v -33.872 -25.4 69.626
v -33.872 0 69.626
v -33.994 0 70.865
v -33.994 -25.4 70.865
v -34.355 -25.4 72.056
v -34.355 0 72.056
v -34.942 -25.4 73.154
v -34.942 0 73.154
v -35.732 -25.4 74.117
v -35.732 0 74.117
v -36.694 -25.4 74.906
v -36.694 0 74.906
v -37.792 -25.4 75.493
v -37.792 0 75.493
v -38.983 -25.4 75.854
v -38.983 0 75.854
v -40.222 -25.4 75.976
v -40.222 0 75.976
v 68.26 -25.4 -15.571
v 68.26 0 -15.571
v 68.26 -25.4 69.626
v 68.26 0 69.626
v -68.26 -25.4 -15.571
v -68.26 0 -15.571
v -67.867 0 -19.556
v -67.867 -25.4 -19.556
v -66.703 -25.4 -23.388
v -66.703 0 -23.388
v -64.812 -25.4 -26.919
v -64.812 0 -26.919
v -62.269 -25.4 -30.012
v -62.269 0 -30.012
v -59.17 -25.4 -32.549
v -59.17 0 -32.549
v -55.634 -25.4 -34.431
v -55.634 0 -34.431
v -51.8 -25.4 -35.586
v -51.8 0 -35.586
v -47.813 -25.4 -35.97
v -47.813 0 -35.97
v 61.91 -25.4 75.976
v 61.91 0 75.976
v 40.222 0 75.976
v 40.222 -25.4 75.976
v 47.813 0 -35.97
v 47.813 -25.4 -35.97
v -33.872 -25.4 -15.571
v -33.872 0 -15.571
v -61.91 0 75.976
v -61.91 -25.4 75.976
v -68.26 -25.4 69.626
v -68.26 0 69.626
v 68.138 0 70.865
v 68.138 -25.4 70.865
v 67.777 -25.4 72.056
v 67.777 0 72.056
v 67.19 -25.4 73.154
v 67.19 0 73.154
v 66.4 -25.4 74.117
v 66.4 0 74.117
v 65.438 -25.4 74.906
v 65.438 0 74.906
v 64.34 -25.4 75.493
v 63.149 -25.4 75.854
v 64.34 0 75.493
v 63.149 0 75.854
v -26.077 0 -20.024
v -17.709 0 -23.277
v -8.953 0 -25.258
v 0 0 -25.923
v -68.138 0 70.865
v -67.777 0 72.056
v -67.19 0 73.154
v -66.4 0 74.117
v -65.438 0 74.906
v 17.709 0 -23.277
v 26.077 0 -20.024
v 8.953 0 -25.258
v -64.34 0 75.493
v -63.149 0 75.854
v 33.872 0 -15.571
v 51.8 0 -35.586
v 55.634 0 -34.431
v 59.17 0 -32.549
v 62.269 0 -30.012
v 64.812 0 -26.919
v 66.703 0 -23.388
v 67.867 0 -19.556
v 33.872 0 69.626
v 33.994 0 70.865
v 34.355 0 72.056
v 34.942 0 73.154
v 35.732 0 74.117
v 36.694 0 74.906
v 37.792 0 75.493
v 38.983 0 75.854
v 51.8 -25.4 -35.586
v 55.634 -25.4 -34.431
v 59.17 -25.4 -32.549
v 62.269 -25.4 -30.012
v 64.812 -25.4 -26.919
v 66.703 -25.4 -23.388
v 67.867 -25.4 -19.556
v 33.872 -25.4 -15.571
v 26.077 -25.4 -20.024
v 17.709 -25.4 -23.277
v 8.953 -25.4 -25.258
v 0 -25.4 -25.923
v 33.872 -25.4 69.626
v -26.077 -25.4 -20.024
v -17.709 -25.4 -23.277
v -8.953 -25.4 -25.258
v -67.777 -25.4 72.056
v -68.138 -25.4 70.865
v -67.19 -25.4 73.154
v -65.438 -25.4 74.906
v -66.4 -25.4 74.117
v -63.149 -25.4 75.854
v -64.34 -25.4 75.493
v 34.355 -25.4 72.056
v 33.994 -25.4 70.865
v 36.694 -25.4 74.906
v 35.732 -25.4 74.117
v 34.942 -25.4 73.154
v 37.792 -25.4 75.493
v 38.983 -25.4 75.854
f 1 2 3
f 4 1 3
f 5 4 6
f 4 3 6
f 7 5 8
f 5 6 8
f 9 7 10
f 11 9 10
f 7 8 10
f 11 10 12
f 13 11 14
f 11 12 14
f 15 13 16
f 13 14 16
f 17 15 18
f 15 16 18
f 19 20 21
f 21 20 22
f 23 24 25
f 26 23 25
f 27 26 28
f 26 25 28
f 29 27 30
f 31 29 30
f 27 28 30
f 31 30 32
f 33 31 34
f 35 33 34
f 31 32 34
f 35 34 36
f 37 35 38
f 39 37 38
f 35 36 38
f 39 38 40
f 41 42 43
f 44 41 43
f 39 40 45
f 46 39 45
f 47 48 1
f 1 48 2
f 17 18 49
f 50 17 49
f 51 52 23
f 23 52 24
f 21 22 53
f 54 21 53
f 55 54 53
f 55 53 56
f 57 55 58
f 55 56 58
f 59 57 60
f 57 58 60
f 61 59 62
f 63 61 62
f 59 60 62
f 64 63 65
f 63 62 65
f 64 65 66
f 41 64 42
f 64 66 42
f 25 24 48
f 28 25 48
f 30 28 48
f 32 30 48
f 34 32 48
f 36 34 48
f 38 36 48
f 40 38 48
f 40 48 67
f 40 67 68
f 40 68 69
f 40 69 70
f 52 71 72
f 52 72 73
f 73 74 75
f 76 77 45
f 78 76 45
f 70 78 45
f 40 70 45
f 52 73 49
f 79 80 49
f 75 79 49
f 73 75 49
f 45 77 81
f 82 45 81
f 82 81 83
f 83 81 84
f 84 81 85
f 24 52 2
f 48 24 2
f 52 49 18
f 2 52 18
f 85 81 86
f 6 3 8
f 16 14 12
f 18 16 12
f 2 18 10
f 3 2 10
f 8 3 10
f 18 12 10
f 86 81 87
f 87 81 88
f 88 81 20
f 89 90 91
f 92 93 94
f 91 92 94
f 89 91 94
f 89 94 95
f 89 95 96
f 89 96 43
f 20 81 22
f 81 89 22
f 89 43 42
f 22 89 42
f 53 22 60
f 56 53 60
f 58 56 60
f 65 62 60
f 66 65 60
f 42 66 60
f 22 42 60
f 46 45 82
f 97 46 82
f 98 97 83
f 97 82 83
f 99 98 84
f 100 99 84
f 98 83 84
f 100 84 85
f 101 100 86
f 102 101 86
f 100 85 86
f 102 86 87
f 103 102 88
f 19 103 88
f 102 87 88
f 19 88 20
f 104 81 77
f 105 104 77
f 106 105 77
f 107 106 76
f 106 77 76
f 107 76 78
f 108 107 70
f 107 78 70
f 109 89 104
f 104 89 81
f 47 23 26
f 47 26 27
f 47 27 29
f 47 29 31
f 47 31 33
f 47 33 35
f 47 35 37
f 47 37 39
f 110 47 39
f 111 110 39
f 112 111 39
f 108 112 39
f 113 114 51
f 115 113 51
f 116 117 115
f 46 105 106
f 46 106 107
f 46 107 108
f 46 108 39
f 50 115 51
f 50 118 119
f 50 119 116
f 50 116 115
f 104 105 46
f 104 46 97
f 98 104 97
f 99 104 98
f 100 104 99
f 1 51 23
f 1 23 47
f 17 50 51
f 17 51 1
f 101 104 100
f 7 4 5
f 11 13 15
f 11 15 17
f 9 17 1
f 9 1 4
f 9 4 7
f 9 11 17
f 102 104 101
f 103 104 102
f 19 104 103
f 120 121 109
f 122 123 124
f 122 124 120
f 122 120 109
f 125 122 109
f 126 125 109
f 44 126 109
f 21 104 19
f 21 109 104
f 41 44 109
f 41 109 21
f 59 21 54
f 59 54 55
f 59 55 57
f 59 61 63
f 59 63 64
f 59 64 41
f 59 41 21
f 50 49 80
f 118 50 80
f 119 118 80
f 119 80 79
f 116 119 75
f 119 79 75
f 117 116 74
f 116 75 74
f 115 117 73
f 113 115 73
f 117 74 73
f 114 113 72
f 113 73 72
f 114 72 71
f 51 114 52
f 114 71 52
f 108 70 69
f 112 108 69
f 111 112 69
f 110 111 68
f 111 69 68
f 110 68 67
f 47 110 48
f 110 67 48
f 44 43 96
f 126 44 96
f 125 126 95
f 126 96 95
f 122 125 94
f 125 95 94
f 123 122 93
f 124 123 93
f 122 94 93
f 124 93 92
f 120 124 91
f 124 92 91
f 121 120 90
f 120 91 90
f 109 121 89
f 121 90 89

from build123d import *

# Parameters (mm, degrees)
F1_DEPTH = 25.4


# Not quite as in the source:
# - the program builds the solid bodies; features that only make, move or delete a surface that nothing else refers to are left out


with BuildPart() as f1:
    # F0 (on Front) → F1 (new body)
    with BuildSketch(Plane.XZ):
        with BuildLine():
            ThreePointArc((0, -25.9232582643), (-17.7094384525, -23.2773241348), (-33.8721087757, -15.5706214843))
            Line((-33.8721087757, -15.5706214843), (-68.2603194002, -15.5706214843))
            ThreePointArc((-68.2603194002, -15.5706214843), (-62.2686711741, -30.0120658628), (-47.8133782744, -35.9702259302))
            Line((-47.8133782744, -35.9702259302), (0, -35.9702259302))
            Line((0, -35.9702259302), (47.8133782744, -35.9702259302))
            ThreePointArc((47.8133782744, -35.9702259302), (62.2686711741, -30.0120658628), (68.2603194002, -15.5706214843))
            Line((68.2603194002, -15.5706214843), (33.8721087757, -15.5706214843))
            ThreePointArc((33.8721087757, -15.5706214843), (17.7094384525, -23.2773241348), (0, -25.9232582643))
        make_face()
        with BuildLine():
            Line((-68.2603194002, -15.5706214843), (-33.8721087757, -15.5706214843))
            Line((-33.8721087757, -15.5706214843), (-33.8721087757, 69.6263722184))
            ThreePointArc((-33.8721087757, 69.6263722184), (-35.7319807152, 74.1165002789), (-40.2221087757, 75.9763722184))
            Line((-40.2221087757, 75.9763722184), (-61.9103194002, 75.9763722184))
            ThreePointArc((-61.9103194002, 75.9763722184), (-66.4004474607, 74.1165002789), (-68.2603194002, 69.6263722184))
            Line((-68.2603194002, 69.6263722184), (-68.2603194002, -15.5706214843))
        make_face()
        with BuildLine():
            Line((33.8721087757, 69.6263722184), (33.8721087757, -15.5706214843))
            Line((33.8721087757, -15.5706214843), (68.2603194002, -15.5706214843))
            Line((68.2603194002, -15.5706214843), (68.2603194002, 69.6263722184))
            ThreePointArc((68.2603194002, 69.6263722184), (66.4004474607, 74.1165002789), (61.9103194002, 75.9763722184))
            Line((61.9103194002, 75.9763722184), (40.2221087757, 75.9763722184))
            ThreePointArc((40.2221087757, 75.9763722184), (35.7319807152, 74.1165002789), (33.8721087757, 69.6263722184))
        make_face()
    extrude(amount=F1_DEPTH)


solid = f1.part
